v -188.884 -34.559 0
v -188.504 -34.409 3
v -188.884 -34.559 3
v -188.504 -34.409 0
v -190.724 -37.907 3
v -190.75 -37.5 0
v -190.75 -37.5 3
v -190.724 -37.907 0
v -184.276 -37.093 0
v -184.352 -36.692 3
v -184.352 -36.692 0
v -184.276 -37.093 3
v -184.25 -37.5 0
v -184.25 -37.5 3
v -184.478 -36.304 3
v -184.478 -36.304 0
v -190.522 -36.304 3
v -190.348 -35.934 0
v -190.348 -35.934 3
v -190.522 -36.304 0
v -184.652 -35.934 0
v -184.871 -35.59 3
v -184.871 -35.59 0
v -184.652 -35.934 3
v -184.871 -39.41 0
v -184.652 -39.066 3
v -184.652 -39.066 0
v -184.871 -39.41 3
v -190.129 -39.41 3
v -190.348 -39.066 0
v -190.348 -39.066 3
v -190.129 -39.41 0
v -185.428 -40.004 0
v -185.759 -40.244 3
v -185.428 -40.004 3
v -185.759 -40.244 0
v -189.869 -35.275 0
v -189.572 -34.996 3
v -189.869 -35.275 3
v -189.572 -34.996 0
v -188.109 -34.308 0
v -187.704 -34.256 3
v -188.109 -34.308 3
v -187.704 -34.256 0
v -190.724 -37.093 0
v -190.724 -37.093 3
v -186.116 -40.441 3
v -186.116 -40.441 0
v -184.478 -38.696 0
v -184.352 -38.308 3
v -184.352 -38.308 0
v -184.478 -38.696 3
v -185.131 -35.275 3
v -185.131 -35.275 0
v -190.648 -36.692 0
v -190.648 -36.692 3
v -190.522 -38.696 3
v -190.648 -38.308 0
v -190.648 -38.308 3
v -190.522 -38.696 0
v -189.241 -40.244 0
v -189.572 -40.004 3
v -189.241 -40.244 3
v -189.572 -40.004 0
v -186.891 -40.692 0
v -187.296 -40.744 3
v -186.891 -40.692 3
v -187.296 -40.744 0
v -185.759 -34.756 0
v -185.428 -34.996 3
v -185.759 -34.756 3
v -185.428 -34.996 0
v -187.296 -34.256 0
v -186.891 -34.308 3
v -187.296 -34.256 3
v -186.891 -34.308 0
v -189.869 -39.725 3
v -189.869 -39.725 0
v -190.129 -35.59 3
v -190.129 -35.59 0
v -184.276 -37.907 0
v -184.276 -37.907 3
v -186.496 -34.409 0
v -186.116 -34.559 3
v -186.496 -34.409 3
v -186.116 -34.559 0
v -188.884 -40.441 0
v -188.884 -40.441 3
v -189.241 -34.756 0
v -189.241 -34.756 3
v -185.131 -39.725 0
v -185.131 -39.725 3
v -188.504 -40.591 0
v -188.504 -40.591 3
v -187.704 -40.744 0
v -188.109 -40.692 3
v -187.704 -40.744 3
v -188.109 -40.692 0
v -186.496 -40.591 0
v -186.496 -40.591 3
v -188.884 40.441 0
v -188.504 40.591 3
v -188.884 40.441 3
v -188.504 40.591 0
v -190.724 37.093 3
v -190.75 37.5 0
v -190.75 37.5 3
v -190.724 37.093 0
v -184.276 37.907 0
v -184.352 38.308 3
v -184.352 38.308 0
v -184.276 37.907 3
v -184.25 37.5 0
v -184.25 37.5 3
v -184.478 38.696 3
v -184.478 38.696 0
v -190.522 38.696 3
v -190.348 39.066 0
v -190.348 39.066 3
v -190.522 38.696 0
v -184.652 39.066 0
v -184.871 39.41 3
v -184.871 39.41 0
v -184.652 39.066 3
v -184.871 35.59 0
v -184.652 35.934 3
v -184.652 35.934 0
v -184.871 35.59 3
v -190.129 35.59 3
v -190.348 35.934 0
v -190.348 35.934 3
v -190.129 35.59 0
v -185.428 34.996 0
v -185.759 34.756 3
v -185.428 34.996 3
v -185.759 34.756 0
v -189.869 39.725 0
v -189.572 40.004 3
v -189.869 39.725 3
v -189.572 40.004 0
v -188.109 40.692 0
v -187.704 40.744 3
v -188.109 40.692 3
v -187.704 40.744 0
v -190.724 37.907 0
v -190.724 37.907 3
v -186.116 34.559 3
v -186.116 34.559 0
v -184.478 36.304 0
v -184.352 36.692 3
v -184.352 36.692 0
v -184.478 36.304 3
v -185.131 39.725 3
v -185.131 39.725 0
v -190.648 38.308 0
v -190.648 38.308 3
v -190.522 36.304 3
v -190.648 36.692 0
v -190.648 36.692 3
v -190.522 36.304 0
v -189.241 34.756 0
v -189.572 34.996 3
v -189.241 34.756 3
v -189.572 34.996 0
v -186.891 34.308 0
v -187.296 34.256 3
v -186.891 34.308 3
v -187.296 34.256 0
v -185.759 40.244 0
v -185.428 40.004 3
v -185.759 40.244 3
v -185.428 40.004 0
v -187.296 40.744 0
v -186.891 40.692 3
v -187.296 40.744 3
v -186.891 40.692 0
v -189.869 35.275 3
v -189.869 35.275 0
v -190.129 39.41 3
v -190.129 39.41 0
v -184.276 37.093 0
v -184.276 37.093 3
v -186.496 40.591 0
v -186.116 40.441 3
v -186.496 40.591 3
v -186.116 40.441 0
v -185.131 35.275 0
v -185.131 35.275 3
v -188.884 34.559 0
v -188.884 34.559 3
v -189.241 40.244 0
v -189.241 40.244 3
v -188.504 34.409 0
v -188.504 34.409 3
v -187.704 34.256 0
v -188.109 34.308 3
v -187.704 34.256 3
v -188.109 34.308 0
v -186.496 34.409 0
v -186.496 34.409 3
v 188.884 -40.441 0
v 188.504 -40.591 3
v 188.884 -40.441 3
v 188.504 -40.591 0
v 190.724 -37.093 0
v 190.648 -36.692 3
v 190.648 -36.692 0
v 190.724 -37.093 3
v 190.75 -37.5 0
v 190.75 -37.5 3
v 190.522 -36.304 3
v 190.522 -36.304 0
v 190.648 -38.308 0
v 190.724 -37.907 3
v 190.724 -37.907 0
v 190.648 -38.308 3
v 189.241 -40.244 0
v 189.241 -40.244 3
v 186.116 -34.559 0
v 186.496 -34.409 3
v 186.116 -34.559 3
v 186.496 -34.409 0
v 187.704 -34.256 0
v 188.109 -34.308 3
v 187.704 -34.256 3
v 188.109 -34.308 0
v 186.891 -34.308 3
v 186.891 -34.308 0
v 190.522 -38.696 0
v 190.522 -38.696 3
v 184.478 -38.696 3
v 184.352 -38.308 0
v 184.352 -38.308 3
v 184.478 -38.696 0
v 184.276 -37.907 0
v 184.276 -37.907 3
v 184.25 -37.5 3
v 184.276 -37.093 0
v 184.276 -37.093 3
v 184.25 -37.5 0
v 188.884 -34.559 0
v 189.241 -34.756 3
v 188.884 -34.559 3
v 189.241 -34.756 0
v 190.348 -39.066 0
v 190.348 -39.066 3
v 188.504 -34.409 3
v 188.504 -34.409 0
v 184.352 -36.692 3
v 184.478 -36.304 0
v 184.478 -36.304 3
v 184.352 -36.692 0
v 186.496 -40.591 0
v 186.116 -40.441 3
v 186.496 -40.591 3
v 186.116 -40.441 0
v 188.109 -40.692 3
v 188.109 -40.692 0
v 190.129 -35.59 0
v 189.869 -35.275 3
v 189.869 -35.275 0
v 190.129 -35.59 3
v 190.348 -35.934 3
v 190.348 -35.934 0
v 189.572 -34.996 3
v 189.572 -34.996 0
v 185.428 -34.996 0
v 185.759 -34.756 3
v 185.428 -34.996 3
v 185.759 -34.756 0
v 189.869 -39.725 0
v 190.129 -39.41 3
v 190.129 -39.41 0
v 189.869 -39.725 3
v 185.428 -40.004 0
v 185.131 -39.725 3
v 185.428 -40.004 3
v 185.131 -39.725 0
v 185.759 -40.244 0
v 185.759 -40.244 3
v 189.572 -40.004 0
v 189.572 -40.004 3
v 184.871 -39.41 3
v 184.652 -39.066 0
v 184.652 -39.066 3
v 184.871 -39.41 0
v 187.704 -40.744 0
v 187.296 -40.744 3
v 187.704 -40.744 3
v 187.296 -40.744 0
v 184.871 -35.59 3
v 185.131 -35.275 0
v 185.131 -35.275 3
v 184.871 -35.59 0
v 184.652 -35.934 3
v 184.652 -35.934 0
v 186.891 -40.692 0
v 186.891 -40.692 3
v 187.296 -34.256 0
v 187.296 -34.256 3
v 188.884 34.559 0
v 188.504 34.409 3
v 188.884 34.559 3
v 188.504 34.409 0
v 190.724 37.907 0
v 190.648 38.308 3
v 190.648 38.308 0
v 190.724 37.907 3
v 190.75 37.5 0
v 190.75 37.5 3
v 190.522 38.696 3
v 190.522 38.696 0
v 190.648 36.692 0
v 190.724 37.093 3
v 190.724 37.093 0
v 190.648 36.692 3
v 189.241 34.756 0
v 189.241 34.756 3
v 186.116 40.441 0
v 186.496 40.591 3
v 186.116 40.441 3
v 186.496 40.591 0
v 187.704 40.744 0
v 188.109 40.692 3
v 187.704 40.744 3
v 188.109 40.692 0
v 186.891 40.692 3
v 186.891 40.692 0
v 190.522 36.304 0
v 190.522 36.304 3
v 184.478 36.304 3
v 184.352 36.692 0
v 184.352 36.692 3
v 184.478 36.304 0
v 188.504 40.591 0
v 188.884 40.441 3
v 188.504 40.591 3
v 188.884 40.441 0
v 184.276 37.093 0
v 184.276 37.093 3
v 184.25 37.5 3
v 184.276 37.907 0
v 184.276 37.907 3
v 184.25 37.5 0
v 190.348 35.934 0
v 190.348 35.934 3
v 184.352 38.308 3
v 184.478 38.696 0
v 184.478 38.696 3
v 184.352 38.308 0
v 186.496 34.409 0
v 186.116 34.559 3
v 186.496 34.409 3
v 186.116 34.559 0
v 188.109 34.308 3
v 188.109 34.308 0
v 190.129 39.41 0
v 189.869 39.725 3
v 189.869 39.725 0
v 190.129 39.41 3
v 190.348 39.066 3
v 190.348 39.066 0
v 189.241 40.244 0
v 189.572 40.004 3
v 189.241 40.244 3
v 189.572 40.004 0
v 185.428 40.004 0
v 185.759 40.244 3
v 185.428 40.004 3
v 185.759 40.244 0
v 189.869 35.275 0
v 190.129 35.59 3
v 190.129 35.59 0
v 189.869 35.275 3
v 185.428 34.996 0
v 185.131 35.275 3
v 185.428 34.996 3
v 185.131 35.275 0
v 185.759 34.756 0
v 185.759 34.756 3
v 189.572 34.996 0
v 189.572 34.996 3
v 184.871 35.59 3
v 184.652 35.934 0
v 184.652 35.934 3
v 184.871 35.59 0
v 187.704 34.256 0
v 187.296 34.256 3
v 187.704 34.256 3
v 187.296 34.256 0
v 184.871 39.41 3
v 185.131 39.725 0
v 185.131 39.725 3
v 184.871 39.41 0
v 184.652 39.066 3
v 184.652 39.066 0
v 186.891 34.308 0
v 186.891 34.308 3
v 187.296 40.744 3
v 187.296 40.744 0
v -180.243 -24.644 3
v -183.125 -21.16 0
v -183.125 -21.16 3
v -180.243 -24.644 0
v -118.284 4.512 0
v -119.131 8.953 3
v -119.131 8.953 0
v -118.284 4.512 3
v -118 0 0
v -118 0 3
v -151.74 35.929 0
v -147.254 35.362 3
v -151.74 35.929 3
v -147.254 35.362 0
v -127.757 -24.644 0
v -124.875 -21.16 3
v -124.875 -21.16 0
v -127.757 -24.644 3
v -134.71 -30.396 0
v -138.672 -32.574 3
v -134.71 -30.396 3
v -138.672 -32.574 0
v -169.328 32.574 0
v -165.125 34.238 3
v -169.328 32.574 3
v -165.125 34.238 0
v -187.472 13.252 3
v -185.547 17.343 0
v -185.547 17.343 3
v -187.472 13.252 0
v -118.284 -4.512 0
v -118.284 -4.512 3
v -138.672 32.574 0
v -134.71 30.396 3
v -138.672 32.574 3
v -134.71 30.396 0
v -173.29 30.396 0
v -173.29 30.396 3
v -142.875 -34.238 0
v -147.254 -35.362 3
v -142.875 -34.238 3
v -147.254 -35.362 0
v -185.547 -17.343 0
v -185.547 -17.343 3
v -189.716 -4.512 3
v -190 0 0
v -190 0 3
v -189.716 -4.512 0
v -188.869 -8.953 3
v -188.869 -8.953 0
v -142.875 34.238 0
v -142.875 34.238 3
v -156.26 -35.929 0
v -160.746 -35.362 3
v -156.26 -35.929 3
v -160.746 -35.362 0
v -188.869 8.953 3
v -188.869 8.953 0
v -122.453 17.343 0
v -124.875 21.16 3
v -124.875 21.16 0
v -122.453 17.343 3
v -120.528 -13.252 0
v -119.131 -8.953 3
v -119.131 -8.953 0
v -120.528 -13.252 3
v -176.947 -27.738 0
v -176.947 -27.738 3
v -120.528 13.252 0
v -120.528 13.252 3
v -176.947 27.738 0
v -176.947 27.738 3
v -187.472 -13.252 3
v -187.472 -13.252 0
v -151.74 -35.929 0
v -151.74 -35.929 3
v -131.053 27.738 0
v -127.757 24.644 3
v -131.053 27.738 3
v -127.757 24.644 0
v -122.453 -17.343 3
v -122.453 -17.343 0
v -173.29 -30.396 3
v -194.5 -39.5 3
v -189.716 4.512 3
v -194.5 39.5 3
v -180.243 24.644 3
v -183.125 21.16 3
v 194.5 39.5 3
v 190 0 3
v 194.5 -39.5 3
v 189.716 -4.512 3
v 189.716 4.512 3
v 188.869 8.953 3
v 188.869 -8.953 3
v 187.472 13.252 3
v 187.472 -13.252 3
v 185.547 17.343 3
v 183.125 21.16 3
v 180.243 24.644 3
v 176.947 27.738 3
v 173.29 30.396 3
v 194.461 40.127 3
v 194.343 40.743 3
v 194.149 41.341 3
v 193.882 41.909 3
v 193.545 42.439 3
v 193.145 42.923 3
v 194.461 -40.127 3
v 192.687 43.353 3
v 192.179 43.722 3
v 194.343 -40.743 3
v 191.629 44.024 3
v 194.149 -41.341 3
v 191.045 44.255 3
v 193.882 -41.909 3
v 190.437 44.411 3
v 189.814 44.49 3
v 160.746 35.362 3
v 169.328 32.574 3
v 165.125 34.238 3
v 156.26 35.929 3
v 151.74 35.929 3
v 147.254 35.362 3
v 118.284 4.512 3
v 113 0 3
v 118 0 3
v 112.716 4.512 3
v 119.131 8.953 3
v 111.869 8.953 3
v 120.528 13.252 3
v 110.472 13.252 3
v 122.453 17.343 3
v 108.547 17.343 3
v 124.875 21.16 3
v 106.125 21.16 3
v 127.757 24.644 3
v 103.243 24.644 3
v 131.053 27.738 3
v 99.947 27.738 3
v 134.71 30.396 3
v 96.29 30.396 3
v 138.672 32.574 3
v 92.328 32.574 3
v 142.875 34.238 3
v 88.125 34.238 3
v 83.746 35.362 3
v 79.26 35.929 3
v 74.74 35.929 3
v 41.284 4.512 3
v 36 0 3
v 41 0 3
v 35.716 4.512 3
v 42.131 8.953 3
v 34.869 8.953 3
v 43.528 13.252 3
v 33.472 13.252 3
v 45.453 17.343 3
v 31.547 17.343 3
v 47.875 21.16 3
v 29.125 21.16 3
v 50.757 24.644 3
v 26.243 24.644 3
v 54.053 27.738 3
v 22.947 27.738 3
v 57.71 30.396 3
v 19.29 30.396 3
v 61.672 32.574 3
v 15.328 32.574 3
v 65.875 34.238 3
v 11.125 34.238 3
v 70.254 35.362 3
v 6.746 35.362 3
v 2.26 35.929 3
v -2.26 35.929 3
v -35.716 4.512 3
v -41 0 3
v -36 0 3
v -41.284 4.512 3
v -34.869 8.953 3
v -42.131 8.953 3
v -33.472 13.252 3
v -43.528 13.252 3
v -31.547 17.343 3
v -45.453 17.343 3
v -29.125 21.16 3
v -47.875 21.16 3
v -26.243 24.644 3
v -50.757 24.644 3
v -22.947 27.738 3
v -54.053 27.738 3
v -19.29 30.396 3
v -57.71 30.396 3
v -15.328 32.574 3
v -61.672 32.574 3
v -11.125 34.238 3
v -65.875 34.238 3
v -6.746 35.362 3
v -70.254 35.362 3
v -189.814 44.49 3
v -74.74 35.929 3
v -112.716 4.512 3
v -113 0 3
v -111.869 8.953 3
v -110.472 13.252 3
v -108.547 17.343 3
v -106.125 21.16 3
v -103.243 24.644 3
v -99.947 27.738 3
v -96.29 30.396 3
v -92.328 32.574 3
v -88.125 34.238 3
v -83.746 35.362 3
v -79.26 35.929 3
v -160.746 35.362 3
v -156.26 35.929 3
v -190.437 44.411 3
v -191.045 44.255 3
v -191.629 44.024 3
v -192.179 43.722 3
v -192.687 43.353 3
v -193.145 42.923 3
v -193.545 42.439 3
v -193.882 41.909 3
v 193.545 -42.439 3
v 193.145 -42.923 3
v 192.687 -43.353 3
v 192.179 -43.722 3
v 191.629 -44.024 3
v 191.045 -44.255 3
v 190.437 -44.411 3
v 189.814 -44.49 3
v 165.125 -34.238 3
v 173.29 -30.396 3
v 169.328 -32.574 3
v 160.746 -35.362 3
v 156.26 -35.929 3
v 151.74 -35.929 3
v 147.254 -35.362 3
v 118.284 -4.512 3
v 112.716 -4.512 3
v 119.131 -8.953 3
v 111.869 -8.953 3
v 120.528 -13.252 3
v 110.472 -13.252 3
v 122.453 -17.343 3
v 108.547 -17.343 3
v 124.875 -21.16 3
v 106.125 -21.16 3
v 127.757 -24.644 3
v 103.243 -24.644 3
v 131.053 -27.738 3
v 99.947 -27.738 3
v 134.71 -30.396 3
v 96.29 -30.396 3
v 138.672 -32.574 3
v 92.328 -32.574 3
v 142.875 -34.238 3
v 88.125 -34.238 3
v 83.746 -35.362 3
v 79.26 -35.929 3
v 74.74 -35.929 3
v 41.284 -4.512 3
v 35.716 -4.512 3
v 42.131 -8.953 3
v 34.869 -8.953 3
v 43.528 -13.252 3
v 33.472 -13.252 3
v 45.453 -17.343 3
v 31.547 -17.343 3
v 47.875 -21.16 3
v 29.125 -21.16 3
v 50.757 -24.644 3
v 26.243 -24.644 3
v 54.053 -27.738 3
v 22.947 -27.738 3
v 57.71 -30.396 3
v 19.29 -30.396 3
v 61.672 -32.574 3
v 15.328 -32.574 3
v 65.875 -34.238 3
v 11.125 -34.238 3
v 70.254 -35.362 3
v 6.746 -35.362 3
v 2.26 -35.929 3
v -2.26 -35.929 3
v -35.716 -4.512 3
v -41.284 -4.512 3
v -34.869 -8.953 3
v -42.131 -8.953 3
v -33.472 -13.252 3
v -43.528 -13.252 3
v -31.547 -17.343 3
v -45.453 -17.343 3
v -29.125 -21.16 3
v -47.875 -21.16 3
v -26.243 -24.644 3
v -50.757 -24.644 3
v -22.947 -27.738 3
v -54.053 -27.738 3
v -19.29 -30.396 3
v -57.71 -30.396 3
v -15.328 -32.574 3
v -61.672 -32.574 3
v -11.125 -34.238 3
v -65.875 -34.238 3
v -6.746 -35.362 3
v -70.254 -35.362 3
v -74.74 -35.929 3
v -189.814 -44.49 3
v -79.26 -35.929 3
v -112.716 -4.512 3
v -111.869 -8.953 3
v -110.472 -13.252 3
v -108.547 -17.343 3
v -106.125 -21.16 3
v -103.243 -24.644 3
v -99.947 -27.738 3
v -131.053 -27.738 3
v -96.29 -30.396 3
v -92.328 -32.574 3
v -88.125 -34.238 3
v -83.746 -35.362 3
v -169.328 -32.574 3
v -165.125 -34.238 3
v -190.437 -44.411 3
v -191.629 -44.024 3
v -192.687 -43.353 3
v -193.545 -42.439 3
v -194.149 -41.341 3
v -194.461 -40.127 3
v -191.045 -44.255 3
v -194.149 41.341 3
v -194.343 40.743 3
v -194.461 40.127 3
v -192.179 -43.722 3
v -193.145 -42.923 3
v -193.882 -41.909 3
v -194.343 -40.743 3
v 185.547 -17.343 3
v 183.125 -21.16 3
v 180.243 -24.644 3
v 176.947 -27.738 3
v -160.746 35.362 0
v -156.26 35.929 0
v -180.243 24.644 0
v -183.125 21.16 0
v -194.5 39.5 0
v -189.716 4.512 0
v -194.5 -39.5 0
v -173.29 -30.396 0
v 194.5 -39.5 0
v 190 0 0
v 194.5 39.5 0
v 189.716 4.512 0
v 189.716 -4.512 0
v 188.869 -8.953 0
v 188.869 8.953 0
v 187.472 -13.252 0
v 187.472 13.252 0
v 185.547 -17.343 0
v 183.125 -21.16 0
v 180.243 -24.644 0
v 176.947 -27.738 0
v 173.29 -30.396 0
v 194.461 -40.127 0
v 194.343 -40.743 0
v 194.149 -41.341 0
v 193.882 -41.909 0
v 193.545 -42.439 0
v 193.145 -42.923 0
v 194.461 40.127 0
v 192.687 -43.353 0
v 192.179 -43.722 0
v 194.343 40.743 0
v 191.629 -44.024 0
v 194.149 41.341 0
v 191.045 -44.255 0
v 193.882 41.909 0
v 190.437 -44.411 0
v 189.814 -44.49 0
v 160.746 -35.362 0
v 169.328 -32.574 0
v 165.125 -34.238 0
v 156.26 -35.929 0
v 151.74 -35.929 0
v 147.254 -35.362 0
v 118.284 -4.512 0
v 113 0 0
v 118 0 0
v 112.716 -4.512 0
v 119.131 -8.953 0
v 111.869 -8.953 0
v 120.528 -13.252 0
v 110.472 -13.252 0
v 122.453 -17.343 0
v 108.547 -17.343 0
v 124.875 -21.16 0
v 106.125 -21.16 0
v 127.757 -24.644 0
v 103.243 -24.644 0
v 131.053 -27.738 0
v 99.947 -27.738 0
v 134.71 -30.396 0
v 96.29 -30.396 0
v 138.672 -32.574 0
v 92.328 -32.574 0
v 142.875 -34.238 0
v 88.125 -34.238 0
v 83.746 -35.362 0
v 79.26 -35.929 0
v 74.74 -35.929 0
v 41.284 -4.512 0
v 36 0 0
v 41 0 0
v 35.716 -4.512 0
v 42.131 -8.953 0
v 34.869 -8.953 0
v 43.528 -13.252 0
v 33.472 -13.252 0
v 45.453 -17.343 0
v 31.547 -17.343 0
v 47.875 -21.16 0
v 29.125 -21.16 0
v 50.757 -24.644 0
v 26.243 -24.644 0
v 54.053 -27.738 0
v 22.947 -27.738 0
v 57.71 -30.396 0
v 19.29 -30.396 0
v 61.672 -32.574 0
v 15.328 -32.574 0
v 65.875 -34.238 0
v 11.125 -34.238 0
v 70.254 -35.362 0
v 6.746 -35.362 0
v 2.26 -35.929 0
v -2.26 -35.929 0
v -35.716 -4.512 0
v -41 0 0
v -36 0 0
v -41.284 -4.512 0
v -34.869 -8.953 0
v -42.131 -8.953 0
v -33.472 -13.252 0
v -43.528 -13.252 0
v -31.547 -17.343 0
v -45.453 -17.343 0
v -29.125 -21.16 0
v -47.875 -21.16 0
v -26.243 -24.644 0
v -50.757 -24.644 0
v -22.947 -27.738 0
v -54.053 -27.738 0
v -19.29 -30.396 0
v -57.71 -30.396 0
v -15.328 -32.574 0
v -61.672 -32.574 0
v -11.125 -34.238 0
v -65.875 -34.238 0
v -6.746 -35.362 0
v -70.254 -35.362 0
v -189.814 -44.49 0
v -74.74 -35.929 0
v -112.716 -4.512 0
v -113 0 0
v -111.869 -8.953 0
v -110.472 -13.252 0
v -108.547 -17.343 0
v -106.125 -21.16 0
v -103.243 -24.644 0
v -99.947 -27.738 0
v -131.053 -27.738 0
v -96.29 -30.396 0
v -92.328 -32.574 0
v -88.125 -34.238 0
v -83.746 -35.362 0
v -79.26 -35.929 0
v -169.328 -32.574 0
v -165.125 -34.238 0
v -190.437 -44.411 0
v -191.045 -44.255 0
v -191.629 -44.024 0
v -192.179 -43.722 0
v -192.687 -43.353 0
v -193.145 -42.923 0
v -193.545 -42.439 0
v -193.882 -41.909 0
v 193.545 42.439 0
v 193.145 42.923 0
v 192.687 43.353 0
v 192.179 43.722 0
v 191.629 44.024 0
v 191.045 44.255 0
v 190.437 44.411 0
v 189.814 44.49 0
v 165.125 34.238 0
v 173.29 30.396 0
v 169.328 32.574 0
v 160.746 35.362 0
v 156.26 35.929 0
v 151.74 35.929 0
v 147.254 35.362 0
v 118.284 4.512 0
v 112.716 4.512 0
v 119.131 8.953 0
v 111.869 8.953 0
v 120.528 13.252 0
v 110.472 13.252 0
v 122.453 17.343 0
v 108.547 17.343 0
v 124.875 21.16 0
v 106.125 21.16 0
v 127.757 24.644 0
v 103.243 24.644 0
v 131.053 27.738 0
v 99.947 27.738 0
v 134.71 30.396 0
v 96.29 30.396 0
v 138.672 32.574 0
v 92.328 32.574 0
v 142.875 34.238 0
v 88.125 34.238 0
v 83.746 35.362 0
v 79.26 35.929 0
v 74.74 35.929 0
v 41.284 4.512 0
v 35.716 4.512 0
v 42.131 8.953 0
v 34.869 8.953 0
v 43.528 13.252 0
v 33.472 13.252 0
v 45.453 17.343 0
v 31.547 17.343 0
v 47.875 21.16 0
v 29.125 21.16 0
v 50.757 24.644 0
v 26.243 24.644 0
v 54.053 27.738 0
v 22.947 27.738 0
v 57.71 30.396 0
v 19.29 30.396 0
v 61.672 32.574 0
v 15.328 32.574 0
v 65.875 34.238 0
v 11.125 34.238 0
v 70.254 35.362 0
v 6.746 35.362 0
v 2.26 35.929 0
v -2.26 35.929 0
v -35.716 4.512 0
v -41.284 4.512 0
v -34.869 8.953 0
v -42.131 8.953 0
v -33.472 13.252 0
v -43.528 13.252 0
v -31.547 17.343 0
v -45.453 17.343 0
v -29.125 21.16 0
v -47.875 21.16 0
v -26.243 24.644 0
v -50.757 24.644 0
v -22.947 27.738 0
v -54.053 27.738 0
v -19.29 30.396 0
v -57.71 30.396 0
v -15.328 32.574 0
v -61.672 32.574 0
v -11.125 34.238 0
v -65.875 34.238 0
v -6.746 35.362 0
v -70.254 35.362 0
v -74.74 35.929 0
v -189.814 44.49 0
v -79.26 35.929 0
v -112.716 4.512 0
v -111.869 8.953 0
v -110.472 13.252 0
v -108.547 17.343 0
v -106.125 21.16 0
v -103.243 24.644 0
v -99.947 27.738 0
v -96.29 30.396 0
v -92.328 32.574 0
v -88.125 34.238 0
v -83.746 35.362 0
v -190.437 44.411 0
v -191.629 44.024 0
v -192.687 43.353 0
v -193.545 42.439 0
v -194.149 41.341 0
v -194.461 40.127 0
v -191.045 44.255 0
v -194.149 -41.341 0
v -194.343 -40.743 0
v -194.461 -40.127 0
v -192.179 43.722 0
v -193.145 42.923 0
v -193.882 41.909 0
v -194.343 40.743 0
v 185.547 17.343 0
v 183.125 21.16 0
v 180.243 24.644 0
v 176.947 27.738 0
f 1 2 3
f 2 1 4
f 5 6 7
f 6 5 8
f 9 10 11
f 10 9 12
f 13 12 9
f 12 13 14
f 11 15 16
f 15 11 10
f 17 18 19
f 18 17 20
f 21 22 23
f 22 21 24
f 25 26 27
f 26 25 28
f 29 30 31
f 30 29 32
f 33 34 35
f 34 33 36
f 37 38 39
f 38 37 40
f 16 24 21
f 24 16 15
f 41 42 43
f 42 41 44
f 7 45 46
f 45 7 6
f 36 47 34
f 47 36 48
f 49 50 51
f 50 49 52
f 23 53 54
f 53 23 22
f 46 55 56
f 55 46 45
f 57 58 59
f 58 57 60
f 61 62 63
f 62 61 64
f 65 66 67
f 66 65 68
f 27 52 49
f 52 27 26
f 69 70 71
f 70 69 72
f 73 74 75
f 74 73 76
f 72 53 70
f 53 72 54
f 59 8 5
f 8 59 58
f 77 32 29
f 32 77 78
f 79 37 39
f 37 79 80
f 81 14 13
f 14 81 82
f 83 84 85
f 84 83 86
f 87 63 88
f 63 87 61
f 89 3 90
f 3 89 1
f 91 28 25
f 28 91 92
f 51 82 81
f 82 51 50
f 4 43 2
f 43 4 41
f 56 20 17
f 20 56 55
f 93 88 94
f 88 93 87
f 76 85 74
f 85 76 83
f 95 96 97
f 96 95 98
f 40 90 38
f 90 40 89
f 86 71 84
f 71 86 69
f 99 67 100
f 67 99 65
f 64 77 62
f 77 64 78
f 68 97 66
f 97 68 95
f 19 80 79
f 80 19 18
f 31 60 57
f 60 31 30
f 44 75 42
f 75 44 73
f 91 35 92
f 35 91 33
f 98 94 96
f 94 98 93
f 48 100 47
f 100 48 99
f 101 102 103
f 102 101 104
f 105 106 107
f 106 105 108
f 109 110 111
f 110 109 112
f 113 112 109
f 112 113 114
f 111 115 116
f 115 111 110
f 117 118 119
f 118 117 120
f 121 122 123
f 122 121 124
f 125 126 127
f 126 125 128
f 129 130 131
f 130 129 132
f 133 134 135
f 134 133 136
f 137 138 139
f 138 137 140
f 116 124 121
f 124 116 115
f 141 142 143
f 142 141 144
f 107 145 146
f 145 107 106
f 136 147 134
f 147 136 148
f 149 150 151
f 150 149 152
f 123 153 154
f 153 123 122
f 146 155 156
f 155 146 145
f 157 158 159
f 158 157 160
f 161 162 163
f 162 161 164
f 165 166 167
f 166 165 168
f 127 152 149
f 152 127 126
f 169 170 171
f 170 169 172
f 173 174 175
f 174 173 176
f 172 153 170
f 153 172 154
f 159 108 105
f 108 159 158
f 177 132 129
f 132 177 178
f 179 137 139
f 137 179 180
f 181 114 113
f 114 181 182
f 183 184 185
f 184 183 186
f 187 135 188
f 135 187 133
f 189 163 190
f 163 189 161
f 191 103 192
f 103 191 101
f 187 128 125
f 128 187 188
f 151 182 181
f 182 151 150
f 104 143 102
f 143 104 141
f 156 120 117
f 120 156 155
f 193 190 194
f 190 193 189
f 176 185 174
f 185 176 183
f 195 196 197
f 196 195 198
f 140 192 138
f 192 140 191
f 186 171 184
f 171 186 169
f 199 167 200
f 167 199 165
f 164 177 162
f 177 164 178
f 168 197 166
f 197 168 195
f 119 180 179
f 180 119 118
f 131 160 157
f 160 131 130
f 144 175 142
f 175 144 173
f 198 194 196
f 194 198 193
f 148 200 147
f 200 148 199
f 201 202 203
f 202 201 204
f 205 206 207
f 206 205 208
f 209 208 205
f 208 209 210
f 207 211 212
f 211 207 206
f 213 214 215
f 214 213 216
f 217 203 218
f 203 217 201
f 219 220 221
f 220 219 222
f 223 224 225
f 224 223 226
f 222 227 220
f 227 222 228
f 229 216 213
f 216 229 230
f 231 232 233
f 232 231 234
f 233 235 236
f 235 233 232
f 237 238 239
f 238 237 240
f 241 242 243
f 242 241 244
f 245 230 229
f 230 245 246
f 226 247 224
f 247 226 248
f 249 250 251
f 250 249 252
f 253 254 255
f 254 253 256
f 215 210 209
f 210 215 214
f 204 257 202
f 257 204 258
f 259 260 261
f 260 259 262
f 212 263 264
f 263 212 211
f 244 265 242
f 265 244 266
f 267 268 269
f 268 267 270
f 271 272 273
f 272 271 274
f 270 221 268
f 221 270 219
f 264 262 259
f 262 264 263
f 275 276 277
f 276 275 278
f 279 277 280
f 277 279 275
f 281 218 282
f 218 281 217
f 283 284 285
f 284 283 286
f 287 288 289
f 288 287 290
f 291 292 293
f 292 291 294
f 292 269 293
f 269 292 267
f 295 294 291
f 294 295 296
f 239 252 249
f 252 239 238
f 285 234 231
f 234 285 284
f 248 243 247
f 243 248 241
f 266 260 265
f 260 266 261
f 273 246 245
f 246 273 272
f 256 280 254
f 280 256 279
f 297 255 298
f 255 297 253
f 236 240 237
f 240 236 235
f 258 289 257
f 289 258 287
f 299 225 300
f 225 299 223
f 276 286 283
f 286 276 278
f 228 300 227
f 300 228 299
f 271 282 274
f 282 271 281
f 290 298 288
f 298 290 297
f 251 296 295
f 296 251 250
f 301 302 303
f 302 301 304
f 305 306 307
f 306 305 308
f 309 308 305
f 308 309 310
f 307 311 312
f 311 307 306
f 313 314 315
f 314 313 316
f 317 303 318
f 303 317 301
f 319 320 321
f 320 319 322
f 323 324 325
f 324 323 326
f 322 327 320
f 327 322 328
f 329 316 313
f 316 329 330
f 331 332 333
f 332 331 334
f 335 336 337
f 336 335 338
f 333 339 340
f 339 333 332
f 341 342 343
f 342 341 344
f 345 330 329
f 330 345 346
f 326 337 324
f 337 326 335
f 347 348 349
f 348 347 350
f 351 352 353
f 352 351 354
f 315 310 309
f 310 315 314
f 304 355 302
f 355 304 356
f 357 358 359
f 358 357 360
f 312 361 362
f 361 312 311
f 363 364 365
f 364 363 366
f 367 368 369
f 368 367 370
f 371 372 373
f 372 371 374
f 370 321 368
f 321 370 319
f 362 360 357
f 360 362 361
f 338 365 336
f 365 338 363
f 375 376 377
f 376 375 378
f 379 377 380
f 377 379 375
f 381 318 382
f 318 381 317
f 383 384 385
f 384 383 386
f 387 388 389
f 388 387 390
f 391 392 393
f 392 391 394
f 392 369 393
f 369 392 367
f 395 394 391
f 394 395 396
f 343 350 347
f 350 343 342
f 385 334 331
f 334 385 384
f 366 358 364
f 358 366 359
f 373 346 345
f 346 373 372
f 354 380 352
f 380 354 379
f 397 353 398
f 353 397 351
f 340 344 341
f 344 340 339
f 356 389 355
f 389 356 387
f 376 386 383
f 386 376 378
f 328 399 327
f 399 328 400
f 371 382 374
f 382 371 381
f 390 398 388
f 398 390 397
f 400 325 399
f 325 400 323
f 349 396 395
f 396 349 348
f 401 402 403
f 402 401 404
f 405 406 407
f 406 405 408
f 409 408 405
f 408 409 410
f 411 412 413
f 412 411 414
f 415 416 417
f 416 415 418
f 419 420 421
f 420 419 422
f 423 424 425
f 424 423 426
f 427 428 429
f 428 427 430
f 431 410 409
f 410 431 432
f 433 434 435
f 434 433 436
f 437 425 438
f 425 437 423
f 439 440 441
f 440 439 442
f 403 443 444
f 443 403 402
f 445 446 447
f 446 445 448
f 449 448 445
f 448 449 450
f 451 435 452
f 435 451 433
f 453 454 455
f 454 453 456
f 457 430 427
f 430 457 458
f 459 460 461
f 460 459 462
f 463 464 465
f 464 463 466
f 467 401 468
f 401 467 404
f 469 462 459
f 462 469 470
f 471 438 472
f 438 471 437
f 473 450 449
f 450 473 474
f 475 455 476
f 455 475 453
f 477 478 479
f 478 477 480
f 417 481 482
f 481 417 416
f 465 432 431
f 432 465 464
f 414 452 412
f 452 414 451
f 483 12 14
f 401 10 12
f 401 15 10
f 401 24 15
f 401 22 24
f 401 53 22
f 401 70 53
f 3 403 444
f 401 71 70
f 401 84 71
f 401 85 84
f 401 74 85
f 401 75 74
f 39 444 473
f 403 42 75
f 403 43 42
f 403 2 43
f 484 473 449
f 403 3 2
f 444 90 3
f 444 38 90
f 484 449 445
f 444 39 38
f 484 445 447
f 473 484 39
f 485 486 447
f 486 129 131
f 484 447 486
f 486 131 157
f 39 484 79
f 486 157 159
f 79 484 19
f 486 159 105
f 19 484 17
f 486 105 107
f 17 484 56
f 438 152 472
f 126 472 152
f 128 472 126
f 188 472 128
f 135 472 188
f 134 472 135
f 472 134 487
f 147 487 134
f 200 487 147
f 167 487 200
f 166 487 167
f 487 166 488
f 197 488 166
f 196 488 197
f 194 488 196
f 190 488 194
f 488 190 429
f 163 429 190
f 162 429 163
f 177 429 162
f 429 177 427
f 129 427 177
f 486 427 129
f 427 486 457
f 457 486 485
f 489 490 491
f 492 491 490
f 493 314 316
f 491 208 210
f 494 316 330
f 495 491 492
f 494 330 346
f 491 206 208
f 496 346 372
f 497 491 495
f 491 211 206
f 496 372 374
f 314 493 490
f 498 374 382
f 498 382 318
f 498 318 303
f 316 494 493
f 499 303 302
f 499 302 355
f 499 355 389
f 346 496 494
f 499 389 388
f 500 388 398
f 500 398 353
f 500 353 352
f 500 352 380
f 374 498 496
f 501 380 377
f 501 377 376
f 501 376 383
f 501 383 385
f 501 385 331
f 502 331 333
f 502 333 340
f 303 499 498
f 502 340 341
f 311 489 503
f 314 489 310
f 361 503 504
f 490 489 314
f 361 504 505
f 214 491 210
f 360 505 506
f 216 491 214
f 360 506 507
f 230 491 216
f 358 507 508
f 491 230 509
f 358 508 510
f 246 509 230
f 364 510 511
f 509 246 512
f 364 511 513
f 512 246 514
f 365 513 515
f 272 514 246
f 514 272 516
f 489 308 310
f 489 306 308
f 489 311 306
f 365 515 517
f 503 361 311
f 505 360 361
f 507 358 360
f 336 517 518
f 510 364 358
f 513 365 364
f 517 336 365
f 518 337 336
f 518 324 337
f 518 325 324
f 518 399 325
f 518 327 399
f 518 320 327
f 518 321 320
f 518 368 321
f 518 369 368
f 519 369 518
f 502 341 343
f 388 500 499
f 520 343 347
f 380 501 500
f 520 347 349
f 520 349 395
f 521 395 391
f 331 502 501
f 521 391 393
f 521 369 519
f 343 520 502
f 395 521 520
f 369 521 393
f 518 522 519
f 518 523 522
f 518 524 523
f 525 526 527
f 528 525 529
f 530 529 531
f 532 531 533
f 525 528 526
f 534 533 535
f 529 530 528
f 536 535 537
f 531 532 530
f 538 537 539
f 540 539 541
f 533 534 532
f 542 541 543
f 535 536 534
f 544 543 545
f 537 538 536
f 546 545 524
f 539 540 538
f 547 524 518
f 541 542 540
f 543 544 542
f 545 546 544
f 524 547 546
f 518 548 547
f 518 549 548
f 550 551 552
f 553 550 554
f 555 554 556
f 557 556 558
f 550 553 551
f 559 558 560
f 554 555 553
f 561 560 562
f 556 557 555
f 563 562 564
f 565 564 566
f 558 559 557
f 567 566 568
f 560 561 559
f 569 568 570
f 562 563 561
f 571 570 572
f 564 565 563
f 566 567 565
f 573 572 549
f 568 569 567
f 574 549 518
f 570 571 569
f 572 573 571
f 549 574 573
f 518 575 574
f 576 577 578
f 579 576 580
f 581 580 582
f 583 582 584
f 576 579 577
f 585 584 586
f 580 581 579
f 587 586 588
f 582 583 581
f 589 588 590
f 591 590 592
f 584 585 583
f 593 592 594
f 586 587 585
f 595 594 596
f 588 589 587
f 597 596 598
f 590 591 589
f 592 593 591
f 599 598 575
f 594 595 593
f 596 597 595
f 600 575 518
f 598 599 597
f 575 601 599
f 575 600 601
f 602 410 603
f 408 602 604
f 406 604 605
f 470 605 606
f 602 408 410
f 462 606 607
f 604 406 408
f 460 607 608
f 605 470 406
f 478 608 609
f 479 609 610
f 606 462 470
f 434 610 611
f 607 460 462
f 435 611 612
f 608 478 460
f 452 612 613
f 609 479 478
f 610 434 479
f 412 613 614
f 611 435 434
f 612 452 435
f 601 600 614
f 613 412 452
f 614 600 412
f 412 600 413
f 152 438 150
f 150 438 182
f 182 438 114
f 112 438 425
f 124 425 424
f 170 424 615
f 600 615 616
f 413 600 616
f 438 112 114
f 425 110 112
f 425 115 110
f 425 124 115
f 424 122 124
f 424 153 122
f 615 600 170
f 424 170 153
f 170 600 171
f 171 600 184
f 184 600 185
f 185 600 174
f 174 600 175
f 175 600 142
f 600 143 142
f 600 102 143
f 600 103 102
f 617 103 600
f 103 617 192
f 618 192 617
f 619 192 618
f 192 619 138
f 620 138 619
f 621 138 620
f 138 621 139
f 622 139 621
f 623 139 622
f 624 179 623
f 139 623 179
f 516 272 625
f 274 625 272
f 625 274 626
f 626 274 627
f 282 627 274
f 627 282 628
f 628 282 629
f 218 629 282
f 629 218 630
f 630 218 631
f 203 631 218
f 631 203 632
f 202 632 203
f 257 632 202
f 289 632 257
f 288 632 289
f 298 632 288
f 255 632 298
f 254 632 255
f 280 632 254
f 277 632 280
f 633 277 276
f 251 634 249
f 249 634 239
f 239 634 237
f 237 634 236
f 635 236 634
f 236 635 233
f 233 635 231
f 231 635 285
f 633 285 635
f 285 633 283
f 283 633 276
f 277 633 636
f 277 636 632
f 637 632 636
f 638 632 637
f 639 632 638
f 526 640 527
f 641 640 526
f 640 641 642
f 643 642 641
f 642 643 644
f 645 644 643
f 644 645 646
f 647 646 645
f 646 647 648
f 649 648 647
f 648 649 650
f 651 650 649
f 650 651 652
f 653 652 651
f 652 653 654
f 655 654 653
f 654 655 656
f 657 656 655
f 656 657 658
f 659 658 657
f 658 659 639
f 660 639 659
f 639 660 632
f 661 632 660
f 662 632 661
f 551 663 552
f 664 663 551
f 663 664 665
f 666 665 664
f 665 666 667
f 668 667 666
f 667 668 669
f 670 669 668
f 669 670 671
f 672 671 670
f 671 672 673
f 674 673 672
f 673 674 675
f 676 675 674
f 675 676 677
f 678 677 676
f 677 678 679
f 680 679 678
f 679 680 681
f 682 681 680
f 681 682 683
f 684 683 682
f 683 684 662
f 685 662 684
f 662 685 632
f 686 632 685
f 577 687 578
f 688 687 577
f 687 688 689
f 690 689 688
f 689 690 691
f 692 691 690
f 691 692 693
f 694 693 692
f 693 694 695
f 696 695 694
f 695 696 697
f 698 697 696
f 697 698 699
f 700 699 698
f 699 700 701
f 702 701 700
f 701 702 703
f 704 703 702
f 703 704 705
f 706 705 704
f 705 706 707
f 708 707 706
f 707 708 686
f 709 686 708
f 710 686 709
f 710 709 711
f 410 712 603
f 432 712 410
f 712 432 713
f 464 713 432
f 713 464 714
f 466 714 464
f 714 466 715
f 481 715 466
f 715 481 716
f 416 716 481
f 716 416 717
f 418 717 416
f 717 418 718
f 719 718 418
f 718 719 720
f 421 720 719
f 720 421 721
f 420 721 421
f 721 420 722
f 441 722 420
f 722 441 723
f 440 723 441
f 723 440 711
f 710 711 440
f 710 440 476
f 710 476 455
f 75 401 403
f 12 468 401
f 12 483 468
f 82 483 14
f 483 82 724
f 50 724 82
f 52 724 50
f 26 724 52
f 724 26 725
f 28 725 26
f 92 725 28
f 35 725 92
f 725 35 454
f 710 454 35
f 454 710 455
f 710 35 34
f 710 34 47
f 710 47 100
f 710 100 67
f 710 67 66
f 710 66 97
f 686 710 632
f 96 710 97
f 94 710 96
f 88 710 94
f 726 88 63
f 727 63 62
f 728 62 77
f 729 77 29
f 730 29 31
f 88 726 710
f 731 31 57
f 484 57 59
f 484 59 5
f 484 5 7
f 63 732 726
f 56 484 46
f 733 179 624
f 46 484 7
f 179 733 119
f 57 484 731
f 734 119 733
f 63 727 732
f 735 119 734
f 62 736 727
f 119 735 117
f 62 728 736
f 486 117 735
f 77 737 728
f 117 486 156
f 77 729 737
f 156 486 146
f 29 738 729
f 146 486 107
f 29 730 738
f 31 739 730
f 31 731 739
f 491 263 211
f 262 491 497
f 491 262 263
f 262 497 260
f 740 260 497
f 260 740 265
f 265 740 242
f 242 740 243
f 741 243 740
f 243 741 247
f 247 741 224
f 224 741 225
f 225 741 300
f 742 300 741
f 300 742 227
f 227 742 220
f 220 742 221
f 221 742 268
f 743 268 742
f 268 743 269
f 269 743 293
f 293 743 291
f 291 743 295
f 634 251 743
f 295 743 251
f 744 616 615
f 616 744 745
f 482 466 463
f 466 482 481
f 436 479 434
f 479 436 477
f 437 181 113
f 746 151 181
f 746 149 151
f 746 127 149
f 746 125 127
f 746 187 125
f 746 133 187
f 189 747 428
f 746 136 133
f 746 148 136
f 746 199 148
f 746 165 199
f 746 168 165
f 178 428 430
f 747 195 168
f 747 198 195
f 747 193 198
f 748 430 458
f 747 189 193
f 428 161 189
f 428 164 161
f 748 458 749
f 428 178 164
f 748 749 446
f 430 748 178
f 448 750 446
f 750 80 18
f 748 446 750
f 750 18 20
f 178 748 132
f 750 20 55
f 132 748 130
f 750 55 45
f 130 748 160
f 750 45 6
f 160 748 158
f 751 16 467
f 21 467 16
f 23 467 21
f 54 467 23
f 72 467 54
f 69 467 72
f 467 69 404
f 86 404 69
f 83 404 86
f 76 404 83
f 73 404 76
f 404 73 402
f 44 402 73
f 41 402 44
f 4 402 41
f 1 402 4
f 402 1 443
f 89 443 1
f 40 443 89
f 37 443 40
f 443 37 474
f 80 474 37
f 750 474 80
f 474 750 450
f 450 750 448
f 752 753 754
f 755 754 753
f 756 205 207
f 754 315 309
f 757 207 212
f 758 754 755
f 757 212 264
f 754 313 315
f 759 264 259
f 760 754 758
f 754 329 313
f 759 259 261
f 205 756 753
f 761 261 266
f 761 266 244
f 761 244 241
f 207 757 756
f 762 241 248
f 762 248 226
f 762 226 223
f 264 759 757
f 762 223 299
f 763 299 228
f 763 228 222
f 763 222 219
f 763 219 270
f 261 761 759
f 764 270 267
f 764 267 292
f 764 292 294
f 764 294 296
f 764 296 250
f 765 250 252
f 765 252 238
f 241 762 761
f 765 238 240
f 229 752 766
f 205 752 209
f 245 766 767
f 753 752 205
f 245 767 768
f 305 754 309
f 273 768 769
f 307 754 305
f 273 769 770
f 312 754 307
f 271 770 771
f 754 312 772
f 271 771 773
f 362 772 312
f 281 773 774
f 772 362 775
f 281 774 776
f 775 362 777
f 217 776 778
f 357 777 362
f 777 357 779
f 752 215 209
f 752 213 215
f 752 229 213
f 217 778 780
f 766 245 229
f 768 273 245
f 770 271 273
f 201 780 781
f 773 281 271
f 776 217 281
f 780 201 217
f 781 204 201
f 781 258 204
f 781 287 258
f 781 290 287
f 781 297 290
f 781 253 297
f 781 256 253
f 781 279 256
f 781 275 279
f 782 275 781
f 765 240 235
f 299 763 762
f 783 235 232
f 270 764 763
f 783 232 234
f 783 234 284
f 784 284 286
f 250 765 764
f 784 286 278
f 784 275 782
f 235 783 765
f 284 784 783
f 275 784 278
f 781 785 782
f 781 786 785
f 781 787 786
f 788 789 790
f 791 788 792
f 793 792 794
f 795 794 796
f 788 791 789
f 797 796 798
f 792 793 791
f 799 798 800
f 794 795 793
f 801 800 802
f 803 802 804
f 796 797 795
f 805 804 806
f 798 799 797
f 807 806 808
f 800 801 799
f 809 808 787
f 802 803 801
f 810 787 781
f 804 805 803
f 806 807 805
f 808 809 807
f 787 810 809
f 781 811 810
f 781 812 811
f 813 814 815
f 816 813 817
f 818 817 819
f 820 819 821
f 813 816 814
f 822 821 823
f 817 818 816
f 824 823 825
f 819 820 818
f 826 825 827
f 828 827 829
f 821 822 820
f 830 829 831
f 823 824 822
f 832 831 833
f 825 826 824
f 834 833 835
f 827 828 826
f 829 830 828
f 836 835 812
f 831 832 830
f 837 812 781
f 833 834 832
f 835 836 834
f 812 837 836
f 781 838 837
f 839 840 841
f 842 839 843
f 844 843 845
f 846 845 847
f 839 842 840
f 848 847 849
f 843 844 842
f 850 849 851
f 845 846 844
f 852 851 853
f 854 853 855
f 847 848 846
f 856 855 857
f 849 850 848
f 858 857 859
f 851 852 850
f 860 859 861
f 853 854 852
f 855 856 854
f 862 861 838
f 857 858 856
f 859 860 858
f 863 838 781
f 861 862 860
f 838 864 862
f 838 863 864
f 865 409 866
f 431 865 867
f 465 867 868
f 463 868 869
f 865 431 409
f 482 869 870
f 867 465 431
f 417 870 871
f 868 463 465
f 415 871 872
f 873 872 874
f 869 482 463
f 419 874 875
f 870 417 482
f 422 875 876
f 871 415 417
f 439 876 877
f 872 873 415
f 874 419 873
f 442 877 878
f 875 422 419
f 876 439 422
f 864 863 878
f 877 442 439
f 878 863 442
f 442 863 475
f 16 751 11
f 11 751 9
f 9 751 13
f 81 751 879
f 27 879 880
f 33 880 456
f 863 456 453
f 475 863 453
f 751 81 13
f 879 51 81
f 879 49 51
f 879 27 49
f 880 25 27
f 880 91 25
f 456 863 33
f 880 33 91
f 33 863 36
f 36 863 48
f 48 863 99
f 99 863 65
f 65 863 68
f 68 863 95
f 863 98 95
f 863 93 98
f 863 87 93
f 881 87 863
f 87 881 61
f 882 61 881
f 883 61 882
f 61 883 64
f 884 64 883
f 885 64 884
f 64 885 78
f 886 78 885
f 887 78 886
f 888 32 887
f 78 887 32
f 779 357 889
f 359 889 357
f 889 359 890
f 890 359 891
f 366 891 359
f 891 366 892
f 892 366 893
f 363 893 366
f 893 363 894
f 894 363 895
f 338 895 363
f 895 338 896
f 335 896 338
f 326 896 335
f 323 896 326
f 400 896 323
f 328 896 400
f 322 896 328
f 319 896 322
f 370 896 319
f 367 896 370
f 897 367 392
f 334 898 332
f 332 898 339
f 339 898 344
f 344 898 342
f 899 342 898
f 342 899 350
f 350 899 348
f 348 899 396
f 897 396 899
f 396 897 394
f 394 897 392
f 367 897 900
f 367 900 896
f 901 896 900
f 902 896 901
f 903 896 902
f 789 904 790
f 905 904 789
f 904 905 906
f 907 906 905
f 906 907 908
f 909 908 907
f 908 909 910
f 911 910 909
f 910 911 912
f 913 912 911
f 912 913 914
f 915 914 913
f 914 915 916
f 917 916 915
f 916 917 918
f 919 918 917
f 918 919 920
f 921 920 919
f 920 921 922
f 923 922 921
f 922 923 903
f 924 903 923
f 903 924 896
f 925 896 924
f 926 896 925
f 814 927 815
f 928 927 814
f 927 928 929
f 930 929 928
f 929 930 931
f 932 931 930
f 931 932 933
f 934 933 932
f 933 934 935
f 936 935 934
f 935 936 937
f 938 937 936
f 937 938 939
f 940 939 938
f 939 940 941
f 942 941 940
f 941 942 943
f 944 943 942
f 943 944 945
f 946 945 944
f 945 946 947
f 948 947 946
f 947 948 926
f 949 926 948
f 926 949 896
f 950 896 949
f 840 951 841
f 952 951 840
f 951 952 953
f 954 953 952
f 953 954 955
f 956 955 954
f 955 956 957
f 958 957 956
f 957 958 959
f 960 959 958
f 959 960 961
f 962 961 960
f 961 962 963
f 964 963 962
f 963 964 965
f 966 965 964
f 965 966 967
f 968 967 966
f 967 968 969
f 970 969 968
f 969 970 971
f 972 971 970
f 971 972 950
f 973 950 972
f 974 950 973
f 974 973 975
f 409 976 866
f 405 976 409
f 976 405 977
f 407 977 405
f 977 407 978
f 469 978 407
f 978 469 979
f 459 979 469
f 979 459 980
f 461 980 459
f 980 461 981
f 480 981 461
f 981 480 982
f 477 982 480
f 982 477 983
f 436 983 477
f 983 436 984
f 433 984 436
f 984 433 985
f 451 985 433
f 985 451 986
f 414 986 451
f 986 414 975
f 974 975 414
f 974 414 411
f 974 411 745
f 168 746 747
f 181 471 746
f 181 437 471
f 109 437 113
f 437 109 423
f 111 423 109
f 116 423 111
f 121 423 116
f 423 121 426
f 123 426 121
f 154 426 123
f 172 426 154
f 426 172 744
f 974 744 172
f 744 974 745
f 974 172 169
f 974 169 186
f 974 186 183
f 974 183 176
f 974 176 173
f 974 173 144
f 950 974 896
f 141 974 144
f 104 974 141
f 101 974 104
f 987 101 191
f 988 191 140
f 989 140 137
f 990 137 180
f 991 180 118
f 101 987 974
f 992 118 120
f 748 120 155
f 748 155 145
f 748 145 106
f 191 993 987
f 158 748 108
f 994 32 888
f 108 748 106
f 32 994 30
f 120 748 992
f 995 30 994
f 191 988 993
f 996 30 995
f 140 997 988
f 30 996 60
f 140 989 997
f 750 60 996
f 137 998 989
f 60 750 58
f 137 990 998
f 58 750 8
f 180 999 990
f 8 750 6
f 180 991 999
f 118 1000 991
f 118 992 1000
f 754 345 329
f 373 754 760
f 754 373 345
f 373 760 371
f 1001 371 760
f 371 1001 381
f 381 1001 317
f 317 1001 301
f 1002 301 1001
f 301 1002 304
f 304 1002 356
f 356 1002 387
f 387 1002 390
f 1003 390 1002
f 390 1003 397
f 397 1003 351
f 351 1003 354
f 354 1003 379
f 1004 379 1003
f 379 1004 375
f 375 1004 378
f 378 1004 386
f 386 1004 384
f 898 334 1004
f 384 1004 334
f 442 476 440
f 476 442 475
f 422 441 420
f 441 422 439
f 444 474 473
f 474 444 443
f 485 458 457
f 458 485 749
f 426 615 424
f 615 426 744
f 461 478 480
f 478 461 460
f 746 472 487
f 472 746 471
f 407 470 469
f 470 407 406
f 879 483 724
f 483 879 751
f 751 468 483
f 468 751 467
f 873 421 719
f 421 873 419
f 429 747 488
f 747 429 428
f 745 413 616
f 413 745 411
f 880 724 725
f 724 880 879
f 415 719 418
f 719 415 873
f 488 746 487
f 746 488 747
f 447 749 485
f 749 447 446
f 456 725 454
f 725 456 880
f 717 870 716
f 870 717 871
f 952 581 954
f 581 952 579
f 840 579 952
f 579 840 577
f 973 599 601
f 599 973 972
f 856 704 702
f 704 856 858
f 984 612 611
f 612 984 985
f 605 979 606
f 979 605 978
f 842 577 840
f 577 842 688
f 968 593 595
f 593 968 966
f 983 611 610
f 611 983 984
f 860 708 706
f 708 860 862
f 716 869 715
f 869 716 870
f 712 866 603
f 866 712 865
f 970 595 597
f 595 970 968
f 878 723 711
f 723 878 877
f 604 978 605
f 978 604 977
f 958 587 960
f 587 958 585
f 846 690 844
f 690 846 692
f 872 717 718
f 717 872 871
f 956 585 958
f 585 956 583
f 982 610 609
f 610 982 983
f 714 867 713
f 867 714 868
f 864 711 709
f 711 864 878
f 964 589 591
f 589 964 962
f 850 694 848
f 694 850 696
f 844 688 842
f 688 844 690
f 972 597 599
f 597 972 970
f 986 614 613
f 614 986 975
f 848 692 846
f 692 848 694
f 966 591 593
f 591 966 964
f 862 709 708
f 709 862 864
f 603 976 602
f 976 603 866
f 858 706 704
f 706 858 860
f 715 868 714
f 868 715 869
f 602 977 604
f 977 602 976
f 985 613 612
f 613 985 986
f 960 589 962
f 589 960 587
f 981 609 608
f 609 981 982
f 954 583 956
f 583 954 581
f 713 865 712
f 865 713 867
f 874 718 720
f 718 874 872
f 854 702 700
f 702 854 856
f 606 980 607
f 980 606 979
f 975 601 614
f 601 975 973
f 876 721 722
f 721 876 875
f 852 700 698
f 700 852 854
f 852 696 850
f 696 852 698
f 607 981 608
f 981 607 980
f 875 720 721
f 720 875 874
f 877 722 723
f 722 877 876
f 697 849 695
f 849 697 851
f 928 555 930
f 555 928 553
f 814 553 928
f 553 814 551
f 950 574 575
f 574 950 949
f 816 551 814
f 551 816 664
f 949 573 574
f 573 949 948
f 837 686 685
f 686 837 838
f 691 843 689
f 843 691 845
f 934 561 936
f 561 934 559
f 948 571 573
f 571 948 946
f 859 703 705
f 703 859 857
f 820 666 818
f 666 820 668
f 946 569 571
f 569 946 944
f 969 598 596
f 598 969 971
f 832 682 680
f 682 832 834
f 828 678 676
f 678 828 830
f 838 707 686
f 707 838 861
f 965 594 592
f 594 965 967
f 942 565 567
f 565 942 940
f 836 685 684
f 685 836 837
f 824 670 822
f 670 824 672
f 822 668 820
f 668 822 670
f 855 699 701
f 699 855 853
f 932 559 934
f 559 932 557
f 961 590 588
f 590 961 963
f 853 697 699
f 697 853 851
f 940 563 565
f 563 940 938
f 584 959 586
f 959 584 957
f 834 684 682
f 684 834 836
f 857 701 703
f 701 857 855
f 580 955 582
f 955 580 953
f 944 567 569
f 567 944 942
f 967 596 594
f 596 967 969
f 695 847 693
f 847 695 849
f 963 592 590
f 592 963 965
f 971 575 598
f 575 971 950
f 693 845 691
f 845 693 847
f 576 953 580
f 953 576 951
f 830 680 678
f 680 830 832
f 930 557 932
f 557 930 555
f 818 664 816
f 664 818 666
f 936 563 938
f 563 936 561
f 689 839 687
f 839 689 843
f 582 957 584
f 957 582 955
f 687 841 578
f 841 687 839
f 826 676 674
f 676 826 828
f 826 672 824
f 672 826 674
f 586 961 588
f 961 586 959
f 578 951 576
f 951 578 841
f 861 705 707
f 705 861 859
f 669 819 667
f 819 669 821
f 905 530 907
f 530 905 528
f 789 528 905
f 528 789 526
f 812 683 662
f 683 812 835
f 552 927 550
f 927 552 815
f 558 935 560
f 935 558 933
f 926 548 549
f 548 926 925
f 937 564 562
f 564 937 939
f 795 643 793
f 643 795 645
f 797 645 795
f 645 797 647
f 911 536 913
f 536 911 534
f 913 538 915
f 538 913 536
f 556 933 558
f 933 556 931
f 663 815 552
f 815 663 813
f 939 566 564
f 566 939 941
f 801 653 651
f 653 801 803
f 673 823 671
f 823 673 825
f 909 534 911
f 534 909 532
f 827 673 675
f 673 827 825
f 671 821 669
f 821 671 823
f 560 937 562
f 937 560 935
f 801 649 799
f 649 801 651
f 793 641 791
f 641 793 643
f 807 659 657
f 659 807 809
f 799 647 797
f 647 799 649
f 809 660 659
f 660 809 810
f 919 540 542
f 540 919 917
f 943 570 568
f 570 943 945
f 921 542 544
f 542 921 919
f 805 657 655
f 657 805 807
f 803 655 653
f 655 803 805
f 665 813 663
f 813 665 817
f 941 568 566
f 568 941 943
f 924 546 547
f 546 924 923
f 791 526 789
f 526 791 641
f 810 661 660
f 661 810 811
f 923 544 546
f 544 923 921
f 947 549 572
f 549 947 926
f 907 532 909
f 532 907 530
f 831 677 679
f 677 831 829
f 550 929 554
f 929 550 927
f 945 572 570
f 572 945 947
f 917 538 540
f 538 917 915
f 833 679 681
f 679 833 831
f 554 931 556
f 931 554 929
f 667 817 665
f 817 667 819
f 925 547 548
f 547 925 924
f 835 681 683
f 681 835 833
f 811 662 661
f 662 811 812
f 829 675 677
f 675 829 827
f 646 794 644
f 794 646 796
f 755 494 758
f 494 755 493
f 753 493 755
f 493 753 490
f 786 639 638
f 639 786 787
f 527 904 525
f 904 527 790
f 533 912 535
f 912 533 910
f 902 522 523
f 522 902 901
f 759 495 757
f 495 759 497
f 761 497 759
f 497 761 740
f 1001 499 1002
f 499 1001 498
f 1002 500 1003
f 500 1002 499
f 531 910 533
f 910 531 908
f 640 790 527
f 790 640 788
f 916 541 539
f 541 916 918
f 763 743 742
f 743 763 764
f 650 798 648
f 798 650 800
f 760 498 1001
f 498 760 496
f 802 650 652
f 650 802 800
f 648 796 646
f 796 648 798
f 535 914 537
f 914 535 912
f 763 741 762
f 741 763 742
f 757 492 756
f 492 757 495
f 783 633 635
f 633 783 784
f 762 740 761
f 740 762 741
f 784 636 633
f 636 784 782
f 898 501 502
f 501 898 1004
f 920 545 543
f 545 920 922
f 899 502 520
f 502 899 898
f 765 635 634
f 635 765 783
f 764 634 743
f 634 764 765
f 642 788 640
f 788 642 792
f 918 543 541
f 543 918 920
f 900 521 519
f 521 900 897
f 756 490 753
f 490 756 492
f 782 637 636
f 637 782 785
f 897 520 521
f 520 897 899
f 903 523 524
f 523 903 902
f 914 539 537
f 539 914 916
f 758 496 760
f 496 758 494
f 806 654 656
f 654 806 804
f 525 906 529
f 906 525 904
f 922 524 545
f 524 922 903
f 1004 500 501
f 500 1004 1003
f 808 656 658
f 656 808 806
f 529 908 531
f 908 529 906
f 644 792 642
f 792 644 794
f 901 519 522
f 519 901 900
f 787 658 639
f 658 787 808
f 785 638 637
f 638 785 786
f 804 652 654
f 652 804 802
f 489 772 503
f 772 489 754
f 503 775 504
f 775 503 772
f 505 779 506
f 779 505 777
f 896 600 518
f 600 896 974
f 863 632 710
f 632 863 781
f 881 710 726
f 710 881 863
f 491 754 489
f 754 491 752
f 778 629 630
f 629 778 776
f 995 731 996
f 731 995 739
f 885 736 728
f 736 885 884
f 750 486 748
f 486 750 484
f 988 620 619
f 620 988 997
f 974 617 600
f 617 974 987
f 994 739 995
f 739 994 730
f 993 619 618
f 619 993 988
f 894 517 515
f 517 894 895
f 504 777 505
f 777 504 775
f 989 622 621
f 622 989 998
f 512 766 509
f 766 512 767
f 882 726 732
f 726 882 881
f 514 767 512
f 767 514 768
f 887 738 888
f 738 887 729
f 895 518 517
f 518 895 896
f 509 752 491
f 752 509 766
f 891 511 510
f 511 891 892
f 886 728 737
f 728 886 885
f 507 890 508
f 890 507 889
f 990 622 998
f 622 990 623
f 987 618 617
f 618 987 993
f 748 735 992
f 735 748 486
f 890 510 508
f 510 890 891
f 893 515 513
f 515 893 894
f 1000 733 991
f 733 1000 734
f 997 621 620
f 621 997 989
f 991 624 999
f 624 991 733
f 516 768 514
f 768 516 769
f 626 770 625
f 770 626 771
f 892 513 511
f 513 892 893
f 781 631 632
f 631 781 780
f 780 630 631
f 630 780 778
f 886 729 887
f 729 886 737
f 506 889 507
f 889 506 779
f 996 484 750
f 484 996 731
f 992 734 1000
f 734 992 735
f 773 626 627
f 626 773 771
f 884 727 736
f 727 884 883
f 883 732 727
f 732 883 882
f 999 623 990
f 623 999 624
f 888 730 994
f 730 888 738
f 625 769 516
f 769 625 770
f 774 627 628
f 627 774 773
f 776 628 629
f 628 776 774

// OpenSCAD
$fn = 50;


difference() {
	union() {
		hull() {
			translate(v = [-189.5000000000, 39.5000000000, 0]) {
				cylinder(h = 3, r = 5);
			}
			translate(v = [189.5000000000, 39.5000000000, 0]) {
				cylinder(h = 3, r = 5);
			}
			translate(v = [-189.5000000000, -39.5000000000, 0]) {
				cylinder(h = 3, r = 5);
			}
			translate(v = [189.5000000000, -39.5000000000, 0]) {
				cylinder(h = 3, r = 5);
			}
		}
	}
	union() {
		#translate(v = [-187.5000000000, -37.5000000000, -100.0000000000]) {
			cylinder(h = 200, r = 3.2500000000);
		}
		#translate(v = [-187.5000000000, 37.5000000000, -100.0000000000]) {
			cylinder(h = 200, r = 3.2500000000);
		}
		#translate(v = [187.5000000000, -37.5000000000, -100.0000000000]) {
			cylinder(h = 200, r = 3.2500000000);
		}
		#translate(v = [187.5000000000, 37.5000000000, -100.0000000000]) {
			cylinder(h = 200, r = 3.2500000000);
		}
		#translate(v = [-154.0000000000, 0, 0]) {
			cylinder(h = 3, r = 36.0000000000);
		}
		#translate(v = [-77.0000000000, 0, 0]) {
			cylinder(h = 3, r = 36.0000000000);
		}
		#cylinder(h = 3, r = 36.0000000000);
		#translate(v = [77.0000000000, 0, 0]) {
			cylinder(h = 3, r = 36.0000000000);
		}
		#translate(v = [154.0000000000, 0, 0]) {
			cylinder(h = 3, r = 36.0000000000);
		}
	}
}
